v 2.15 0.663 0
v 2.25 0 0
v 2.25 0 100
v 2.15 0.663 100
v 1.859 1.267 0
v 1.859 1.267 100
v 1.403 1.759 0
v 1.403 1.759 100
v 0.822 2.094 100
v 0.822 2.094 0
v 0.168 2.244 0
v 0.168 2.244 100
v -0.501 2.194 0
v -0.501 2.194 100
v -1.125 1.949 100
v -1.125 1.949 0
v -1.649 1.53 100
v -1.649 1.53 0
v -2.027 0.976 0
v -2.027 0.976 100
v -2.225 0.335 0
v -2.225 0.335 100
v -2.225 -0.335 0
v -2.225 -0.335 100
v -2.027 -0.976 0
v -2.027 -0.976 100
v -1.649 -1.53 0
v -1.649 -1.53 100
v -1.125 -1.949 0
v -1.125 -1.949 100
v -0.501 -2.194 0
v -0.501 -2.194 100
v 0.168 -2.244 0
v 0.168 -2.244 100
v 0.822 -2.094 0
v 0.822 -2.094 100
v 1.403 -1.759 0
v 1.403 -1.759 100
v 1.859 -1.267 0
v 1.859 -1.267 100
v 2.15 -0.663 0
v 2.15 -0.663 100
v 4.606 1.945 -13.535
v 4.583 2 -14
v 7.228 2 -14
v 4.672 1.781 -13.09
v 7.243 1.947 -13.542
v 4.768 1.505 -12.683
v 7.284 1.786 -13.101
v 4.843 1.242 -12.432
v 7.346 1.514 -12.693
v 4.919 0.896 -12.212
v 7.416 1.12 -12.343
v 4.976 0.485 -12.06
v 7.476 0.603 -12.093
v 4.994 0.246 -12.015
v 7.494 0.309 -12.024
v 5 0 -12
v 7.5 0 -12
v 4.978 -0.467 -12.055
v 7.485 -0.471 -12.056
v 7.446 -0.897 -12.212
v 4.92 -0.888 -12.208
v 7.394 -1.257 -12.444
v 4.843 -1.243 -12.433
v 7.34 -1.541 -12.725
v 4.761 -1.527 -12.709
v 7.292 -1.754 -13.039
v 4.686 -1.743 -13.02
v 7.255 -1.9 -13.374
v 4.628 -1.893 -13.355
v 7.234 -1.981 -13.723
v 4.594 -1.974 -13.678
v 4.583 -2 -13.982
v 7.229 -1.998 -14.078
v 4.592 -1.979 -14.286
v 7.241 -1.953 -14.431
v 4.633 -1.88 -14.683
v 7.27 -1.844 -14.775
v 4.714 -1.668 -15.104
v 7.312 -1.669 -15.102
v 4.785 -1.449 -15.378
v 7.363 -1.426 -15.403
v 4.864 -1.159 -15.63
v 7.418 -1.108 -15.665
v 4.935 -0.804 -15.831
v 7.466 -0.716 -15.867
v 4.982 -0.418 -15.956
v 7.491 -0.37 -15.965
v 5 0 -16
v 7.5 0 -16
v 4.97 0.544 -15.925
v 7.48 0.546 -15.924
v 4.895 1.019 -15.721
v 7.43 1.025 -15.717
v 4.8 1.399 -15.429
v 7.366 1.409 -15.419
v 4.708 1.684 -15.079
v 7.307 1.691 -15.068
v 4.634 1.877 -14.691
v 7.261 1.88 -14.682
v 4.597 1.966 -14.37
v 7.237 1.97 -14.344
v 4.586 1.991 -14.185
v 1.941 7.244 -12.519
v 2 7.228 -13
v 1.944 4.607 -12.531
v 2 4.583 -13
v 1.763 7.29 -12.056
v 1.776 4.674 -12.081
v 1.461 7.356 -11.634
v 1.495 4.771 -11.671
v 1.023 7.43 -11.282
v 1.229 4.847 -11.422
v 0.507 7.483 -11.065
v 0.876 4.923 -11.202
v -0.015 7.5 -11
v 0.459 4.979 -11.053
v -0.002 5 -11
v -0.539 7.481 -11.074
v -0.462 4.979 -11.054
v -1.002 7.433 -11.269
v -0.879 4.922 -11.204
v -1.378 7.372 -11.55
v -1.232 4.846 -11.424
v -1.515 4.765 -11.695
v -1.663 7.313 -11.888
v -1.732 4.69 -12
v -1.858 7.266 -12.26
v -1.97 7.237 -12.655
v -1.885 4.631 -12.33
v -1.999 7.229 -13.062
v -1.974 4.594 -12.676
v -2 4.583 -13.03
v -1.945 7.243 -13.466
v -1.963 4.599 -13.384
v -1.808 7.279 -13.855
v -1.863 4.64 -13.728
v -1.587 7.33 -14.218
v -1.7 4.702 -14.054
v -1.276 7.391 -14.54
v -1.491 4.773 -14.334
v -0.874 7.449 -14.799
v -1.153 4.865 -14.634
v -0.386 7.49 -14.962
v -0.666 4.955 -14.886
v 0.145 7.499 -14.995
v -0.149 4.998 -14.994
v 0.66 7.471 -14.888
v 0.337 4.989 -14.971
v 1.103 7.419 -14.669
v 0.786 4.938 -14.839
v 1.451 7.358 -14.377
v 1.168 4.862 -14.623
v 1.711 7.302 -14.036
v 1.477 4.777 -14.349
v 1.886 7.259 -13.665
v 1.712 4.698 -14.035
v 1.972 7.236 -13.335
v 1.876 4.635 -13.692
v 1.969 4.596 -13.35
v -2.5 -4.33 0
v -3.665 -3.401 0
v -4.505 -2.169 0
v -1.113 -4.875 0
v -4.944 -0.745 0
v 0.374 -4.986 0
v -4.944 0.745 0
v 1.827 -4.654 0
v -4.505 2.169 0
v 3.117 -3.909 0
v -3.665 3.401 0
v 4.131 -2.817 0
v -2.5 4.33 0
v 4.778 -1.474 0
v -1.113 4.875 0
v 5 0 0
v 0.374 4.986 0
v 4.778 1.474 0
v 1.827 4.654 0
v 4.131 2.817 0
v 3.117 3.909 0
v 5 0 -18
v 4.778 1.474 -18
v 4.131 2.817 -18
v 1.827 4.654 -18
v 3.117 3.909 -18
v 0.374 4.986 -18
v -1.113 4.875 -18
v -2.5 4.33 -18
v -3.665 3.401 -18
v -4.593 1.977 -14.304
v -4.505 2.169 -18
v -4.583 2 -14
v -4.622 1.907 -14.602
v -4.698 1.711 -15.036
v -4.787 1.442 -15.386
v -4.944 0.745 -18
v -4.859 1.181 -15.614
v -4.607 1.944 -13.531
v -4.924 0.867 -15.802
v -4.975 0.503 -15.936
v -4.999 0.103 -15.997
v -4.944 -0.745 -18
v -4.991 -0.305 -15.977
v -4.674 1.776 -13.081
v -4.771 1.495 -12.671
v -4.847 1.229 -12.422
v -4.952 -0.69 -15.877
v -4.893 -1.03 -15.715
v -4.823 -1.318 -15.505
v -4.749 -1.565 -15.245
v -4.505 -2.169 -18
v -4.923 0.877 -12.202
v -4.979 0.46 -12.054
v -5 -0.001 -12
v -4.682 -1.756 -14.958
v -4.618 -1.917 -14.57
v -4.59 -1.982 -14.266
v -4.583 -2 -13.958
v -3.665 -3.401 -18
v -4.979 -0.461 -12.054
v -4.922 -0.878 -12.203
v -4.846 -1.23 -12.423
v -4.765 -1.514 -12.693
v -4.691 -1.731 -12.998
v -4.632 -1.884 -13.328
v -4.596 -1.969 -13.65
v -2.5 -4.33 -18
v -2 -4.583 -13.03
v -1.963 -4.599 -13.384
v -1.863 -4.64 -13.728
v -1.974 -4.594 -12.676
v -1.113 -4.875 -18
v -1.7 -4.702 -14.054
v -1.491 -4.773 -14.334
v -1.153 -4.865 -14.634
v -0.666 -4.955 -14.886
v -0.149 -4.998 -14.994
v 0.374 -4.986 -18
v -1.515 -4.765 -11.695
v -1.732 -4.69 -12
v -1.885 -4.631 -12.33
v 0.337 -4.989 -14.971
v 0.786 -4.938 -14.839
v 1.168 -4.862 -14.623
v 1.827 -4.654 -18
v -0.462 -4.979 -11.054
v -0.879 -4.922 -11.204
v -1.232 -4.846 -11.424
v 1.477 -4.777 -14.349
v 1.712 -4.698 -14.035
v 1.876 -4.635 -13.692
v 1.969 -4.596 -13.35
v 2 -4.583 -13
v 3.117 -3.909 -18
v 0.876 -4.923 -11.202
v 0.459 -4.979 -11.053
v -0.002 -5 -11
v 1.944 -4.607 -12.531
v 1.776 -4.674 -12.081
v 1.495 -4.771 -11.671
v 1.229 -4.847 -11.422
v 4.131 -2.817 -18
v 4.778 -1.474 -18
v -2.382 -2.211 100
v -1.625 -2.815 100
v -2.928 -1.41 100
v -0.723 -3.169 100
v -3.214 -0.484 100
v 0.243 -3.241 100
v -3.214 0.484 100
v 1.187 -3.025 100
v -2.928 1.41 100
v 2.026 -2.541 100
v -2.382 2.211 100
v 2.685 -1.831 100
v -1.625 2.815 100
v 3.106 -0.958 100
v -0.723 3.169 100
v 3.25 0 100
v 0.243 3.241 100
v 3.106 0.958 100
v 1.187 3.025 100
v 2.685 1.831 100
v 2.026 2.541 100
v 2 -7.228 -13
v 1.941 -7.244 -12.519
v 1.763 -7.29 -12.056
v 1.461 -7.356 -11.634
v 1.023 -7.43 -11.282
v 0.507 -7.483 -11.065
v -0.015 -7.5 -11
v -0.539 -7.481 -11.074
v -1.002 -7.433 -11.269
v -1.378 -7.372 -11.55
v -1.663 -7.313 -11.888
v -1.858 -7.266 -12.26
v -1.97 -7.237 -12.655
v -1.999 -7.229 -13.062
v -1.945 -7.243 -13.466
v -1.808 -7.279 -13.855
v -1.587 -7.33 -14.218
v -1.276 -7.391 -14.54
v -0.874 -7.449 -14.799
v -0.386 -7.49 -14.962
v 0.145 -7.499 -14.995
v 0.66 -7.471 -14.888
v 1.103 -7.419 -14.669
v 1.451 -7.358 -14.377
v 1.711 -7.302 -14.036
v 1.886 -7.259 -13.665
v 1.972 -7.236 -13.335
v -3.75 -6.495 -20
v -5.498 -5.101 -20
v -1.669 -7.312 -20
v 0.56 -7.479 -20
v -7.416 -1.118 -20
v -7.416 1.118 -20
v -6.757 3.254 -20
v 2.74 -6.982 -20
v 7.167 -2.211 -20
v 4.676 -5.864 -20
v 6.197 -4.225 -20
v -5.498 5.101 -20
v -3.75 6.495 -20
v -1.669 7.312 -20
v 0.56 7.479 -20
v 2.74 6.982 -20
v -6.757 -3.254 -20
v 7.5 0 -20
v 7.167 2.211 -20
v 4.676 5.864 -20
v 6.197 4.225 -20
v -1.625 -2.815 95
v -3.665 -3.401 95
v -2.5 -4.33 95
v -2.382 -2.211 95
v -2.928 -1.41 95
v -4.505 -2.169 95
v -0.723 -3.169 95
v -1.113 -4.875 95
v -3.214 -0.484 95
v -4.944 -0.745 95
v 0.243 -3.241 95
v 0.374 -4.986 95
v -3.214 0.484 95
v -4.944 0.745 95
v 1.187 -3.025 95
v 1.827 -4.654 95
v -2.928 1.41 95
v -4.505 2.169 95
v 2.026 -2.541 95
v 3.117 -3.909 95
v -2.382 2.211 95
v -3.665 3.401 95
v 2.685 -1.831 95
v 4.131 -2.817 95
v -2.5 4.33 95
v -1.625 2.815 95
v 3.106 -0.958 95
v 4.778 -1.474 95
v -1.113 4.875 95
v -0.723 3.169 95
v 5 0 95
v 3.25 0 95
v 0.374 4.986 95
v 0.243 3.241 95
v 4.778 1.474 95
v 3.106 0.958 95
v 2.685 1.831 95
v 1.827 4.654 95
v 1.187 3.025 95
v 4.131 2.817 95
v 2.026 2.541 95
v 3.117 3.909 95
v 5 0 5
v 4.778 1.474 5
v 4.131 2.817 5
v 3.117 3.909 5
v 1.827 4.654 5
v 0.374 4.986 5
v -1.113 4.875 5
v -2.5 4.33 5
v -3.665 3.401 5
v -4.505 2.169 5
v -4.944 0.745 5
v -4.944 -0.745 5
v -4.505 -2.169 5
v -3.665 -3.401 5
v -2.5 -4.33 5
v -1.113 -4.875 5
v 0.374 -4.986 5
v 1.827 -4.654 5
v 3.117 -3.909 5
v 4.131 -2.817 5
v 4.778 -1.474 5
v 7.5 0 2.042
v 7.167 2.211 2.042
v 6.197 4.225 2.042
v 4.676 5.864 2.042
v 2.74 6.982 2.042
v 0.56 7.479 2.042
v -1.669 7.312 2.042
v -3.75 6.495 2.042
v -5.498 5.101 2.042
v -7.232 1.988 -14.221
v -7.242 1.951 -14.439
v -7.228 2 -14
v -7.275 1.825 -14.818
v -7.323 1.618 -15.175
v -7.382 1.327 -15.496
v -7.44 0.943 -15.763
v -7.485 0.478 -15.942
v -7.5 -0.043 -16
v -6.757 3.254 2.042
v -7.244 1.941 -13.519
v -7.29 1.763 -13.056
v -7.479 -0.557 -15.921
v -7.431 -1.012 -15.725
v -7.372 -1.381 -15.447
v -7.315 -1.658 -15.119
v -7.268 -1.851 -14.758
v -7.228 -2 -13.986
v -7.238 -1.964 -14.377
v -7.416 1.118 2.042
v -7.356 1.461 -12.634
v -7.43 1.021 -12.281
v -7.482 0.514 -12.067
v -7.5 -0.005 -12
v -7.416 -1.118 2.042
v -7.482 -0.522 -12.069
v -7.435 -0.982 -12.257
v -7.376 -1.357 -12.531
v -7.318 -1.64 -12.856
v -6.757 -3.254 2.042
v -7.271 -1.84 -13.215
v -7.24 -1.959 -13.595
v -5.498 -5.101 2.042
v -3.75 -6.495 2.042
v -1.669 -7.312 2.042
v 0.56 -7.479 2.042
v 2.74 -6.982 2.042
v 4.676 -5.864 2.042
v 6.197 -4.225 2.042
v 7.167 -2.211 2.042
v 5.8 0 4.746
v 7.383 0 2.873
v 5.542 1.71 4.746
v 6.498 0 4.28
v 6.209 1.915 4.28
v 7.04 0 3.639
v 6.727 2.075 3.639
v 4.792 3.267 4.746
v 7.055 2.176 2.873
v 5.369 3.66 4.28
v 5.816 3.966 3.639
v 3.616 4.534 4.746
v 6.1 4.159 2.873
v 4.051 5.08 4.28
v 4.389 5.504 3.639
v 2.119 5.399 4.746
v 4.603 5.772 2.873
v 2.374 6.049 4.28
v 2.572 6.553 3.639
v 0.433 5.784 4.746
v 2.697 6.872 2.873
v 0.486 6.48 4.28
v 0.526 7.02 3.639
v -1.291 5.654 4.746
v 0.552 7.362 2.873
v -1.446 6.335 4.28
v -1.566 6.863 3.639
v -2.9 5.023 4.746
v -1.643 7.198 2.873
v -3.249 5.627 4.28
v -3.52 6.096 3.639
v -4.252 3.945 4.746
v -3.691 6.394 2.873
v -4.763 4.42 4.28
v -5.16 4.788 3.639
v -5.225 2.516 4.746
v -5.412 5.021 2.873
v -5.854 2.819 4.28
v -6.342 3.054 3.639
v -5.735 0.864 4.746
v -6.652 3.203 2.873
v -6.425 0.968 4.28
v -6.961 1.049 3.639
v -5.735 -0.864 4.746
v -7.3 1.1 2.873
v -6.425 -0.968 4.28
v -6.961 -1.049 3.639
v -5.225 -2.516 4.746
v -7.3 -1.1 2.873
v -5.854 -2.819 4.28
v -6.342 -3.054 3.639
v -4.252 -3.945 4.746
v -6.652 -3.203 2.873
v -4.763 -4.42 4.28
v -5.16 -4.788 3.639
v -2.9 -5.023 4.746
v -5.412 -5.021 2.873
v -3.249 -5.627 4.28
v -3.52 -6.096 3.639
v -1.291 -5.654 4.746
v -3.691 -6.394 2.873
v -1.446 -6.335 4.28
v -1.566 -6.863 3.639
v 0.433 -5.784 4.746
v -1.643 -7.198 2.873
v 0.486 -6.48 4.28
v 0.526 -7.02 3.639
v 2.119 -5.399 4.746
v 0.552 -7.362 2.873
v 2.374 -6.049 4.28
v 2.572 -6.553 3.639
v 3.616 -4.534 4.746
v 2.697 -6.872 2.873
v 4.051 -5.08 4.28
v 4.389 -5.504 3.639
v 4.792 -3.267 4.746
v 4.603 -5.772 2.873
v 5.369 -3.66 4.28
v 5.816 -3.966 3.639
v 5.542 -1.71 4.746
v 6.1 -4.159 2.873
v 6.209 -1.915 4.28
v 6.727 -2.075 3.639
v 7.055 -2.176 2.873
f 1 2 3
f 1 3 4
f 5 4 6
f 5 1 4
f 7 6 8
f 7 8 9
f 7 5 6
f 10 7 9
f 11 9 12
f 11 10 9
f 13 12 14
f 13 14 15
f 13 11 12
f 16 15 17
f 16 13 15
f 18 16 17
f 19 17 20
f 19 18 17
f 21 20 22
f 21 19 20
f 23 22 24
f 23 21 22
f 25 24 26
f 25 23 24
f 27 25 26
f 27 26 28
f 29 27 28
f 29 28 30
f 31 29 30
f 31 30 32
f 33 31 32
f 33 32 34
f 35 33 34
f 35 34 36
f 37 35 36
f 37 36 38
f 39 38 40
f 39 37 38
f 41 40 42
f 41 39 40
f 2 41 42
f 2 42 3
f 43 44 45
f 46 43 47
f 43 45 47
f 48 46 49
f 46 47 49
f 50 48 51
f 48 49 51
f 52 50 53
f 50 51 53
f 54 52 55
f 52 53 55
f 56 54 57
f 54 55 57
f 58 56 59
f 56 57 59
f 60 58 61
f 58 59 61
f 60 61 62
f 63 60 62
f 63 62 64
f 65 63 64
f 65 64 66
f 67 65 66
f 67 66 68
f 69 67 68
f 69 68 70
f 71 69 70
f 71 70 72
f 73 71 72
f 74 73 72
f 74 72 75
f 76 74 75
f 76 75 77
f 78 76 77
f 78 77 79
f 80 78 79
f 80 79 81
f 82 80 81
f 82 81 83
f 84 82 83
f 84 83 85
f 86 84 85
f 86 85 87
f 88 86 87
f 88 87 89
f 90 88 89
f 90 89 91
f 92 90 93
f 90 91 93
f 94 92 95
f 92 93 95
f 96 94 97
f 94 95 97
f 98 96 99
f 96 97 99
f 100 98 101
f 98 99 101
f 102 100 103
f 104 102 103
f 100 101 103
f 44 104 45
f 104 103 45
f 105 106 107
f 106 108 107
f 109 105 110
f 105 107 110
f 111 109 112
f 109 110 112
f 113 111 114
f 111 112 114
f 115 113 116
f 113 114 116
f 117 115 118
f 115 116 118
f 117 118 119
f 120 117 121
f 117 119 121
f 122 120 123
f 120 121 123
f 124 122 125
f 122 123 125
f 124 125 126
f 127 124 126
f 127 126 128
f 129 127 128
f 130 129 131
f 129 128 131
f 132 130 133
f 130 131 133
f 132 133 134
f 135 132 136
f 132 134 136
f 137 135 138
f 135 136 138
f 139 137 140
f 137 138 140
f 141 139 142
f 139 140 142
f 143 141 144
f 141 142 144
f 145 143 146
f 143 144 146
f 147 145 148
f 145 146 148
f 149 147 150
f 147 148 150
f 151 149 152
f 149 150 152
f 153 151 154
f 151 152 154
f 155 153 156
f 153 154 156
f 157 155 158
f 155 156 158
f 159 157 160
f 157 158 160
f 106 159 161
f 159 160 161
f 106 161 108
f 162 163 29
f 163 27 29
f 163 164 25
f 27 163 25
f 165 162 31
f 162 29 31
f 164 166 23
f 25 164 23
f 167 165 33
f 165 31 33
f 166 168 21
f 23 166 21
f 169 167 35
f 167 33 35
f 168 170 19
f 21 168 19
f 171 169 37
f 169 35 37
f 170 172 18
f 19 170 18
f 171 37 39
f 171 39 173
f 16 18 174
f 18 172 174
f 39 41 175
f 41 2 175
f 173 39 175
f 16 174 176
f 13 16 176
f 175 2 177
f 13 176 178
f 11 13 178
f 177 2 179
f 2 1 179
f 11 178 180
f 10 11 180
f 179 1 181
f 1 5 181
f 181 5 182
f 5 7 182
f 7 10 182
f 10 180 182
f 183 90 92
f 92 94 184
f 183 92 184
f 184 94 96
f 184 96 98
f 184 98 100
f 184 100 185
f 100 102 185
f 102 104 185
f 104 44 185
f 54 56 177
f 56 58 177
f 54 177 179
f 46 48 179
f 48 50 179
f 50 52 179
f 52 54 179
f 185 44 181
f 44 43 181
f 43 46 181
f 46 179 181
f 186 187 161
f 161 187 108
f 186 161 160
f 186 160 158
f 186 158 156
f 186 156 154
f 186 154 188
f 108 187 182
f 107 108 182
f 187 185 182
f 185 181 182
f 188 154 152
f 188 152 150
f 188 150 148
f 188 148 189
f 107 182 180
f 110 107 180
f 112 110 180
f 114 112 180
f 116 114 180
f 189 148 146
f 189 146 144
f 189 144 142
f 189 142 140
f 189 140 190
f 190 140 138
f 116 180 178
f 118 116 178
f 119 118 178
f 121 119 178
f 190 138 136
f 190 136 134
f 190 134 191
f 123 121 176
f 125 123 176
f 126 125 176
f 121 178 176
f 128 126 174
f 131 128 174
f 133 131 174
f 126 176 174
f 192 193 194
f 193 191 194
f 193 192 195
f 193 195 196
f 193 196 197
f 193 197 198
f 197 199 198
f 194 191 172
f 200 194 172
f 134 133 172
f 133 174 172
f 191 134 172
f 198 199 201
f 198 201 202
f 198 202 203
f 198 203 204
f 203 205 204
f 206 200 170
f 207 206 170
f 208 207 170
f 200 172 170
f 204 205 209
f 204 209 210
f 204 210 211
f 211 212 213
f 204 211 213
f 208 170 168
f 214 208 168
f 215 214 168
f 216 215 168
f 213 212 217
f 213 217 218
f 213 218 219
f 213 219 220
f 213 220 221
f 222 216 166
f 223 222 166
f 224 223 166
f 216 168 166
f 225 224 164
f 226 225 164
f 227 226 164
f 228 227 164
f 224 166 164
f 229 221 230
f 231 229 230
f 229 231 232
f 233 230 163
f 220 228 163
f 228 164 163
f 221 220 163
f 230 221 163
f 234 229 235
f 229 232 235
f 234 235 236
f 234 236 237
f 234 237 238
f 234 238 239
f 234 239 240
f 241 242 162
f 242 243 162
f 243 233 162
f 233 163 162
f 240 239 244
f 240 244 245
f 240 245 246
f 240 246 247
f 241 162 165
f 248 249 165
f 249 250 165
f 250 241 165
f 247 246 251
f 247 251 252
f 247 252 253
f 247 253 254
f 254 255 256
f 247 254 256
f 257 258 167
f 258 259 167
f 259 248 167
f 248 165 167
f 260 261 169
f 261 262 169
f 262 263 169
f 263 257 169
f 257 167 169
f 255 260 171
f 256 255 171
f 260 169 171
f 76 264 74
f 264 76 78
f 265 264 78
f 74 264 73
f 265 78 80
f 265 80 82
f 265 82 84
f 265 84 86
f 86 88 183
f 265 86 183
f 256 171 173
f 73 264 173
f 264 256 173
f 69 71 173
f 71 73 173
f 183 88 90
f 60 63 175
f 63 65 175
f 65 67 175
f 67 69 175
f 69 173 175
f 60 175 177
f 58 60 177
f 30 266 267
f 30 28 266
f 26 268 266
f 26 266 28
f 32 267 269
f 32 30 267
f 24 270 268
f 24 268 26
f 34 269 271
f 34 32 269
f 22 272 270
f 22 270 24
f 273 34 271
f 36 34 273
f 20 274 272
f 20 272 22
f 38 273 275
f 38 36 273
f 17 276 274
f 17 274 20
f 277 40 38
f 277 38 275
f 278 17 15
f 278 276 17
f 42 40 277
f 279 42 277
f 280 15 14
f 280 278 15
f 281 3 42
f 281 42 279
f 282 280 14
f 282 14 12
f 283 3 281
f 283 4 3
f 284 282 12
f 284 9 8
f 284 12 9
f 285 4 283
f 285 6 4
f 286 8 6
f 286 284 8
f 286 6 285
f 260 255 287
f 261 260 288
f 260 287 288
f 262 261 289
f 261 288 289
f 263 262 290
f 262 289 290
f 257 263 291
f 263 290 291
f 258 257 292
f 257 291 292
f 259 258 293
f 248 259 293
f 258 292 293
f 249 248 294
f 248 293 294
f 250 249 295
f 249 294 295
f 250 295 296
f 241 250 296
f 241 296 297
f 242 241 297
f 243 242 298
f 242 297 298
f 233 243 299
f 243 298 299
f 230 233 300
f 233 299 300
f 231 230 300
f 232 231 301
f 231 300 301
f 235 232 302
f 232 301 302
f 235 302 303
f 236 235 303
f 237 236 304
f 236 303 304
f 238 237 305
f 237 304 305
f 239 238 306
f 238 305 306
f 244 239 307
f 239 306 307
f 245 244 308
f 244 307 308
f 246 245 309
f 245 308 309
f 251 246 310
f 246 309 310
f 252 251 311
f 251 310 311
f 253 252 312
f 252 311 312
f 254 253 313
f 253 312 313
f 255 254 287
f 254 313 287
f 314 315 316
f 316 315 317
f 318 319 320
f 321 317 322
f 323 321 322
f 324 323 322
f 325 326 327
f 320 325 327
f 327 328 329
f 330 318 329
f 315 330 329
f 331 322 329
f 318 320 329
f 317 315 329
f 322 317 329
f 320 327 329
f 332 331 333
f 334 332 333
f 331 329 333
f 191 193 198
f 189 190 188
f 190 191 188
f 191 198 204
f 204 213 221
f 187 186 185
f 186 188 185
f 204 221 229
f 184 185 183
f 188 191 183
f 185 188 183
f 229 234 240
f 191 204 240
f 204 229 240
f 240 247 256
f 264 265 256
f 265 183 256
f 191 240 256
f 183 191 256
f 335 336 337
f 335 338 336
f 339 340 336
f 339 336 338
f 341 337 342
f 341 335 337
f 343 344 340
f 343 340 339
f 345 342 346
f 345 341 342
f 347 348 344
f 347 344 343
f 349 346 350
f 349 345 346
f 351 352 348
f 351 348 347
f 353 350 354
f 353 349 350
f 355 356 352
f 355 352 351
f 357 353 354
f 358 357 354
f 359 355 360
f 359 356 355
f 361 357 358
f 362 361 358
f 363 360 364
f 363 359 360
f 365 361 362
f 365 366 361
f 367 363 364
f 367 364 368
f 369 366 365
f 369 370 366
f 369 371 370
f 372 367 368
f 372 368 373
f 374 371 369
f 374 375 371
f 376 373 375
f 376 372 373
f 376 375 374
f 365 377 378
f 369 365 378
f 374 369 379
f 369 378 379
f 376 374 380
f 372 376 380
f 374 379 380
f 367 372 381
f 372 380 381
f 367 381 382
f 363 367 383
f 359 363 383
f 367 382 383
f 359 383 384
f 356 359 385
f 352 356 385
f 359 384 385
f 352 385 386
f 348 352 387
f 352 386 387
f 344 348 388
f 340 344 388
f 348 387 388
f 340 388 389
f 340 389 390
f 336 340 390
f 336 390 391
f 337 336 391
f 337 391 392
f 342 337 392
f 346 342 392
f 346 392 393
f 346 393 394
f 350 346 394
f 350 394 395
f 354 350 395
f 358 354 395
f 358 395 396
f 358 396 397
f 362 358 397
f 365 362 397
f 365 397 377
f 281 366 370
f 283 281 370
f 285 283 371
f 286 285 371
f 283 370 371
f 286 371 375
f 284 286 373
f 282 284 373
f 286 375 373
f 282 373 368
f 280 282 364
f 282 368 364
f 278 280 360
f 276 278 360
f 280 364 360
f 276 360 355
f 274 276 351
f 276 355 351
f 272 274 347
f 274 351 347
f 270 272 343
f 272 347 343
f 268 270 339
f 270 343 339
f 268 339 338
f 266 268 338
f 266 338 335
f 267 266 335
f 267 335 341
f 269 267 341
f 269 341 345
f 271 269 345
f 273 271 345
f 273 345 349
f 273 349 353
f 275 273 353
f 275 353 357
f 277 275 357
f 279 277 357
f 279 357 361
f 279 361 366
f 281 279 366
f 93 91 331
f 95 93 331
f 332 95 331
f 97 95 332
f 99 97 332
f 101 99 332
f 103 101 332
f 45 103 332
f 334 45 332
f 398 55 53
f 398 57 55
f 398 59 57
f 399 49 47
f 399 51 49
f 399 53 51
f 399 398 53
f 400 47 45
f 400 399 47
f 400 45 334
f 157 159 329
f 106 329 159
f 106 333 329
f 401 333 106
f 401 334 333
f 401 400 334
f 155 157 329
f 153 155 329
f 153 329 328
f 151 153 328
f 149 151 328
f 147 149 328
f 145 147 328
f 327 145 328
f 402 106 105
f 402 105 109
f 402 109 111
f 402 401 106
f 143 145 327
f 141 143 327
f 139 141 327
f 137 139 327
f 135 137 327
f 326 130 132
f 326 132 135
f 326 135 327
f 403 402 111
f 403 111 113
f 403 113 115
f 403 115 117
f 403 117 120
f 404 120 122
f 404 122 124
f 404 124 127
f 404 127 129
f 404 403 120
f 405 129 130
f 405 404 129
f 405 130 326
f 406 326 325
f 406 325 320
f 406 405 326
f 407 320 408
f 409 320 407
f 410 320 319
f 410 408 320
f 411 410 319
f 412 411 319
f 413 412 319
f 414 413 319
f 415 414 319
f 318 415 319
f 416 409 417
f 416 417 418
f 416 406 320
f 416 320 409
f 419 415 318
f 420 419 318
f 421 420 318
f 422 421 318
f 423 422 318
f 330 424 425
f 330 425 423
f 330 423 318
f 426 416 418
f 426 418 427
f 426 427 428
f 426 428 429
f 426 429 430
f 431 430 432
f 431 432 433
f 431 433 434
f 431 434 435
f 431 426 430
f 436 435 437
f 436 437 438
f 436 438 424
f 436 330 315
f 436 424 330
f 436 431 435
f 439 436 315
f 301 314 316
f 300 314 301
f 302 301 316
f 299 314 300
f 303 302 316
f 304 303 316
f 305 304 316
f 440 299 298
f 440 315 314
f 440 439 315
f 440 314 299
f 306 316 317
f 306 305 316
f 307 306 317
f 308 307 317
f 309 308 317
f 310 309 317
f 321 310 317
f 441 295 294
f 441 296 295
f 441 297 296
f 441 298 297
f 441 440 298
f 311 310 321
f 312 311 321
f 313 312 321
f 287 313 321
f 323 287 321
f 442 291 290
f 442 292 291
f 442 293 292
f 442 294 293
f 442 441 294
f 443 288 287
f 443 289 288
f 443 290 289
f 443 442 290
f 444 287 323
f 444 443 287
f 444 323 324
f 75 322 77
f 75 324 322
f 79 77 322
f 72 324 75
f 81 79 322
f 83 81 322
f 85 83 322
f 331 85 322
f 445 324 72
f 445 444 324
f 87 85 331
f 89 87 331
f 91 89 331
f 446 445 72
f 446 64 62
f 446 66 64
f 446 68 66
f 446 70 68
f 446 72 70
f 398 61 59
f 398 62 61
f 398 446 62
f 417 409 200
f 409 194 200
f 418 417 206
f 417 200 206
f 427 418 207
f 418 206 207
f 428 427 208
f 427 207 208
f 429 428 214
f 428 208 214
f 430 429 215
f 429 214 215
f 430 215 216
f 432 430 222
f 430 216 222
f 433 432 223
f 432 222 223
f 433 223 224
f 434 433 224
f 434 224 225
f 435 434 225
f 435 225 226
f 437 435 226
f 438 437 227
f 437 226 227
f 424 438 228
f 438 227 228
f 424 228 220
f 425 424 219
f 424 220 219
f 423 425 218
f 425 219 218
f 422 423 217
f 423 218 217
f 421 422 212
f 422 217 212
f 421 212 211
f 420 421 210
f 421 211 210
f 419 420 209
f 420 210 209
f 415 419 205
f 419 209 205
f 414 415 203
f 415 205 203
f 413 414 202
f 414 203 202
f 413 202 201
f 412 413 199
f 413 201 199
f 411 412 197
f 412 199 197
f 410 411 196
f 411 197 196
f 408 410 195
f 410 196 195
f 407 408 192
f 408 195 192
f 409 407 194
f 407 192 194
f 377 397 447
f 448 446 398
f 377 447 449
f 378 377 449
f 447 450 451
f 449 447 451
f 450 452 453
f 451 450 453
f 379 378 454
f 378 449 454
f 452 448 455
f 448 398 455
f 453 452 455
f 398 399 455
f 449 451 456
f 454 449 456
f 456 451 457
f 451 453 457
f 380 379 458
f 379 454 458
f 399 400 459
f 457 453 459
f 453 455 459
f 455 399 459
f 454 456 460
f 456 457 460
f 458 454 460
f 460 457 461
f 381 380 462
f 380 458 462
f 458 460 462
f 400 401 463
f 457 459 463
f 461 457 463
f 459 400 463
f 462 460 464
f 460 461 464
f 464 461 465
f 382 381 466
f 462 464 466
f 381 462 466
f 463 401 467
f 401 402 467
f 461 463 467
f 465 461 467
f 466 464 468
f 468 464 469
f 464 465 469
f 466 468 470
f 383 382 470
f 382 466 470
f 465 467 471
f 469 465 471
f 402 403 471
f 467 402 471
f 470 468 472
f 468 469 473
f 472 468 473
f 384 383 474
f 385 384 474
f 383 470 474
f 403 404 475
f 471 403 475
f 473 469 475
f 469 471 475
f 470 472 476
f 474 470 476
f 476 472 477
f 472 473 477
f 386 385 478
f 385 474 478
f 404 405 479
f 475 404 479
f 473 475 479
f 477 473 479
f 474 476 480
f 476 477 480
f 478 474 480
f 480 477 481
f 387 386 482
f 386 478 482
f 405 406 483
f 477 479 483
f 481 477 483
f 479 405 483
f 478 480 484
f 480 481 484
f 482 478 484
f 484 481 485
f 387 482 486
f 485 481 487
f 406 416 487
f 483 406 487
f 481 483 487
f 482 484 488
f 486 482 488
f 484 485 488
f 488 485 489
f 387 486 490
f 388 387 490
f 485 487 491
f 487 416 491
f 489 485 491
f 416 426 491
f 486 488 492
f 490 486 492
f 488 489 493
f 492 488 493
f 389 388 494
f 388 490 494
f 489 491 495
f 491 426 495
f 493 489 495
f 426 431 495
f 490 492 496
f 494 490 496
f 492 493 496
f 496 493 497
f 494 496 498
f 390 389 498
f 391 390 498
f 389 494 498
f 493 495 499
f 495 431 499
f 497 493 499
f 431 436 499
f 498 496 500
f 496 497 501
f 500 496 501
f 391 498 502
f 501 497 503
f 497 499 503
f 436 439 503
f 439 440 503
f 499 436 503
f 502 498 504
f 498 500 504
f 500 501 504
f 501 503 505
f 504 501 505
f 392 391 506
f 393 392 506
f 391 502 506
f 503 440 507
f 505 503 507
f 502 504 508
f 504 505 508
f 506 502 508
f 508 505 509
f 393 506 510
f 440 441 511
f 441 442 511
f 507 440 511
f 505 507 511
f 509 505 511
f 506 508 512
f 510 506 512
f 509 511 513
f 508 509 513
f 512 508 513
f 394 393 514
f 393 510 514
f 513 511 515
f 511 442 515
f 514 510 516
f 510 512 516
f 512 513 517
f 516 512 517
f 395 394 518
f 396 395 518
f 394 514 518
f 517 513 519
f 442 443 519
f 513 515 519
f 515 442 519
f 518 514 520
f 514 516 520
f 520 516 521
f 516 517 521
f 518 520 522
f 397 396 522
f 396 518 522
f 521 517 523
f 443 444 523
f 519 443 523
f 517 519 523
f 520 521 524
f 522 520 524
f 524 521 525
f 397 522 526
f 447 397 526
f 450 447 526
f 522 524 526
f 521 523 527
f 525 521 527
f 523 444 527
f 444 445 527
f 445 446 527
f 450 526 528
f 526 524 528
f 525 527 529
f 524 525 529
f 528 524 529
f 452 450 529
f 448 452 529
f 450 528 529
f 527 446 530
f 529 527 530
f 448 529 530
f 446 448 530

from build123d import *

# Parameters (mm, degrees)
F0_R      = 3.25
F0_R_2    = 2.25
F1_DEPTH  = 100
F0_R_3    = 5
F2_DEPTH  = 95
F0_R_4    = 7.5
F3_DEPTH  = 5
F4_DEPTH  = 20
F6_R      = 5.5
F7_DEPTH  = 2
F8_R      = 2
F9_DEPTH  = 12.5
F10_R     = 2
F11_DEPTH = 12.5


# Not quite as in the source:
# - a fillet or chamfer that OpenCascade refuses, or shapes differently, is made with other operations: its cross-section is extruded or revolved along the edge and cut away or added


with BuildPart() as f1:
    # F0 (on Top) → F1 (new body)
    with BuildSketch(Plane.XY):
        Circle(F0_R)
        Circle(F0_R_2, mode=Mode.SUBTRACT)
    extrude(amount=F1_DEPTH)

    # F0 (on Top) → F2 (join)
    with BuildSketch(Plane.XY):
        Circle(F0_R_3)
        Circle(F0_R, mode=Mode.SUBTRACT)
    extrude(amount=F2_DEPTH)

    # F0 (on Top) → F3 (join)
    with BuildSketch(Plane.XY):
        Circle(F0_R_4)
        Circle(F0_R_3, mode=Mode.SUBTRACT)
    extrude(amount=F3_DEPTH)

    # F0 (on Top) → F4 (join)
    with BuildSketch(Plane.XY):
        Circle(F0_R_4)
        Circle(F0_R_3, mode=Mode.SUBTRACT)
    extrude(amount=-F4_DEPTH)

    # F6 (on offset) → F7 (join)
    with BuildSketch(Plane(origin=(0, 0, -20), x_dir=(1, 0, 0), z_dir=(0, 0, -1))):
        Circle(F6_R)
    extrude(amount=-F7_DEPTH)

    # F8 (on Front) → F9 (cut, symmetric)
    with BuildSketch(Plane.XZ):
        with Locations((0, -13)):
            Circle(F8_R)
    extrude(amount=F9_DEPTH, both=True, mode=Mode.SUBTRACT)

    # F10 (on Right) → F11 (cut, symmetric)
    with BuildSketch(Plane.YZ):
        with Locations((0, -14)):
            Circle(F10_R)
    extrude(amount=F11_DEPTH, both=True, mode=Mode.SUBTRACT)

    # F12: fillet of radius 3 on 1 edges, made by hand

    # F12_s1 → F12_t2 (revolve, cut)
    with BuildSketch(Plane.XZ):
        with BuildLine():
            ThreePointArc((5, 5), (6.7912878475, 3.9784517816), (7.5, 2.0419601084))
            Line((7.5, 2.0419601084), (7.5, 5))
            Line((7.5, 5), (5, 5))
        make_face()
    revolve(axis=Axis((0, 0, 5), (0, 0, 1)), mode=Mode.SUBTRACT)


solid = f1.part
